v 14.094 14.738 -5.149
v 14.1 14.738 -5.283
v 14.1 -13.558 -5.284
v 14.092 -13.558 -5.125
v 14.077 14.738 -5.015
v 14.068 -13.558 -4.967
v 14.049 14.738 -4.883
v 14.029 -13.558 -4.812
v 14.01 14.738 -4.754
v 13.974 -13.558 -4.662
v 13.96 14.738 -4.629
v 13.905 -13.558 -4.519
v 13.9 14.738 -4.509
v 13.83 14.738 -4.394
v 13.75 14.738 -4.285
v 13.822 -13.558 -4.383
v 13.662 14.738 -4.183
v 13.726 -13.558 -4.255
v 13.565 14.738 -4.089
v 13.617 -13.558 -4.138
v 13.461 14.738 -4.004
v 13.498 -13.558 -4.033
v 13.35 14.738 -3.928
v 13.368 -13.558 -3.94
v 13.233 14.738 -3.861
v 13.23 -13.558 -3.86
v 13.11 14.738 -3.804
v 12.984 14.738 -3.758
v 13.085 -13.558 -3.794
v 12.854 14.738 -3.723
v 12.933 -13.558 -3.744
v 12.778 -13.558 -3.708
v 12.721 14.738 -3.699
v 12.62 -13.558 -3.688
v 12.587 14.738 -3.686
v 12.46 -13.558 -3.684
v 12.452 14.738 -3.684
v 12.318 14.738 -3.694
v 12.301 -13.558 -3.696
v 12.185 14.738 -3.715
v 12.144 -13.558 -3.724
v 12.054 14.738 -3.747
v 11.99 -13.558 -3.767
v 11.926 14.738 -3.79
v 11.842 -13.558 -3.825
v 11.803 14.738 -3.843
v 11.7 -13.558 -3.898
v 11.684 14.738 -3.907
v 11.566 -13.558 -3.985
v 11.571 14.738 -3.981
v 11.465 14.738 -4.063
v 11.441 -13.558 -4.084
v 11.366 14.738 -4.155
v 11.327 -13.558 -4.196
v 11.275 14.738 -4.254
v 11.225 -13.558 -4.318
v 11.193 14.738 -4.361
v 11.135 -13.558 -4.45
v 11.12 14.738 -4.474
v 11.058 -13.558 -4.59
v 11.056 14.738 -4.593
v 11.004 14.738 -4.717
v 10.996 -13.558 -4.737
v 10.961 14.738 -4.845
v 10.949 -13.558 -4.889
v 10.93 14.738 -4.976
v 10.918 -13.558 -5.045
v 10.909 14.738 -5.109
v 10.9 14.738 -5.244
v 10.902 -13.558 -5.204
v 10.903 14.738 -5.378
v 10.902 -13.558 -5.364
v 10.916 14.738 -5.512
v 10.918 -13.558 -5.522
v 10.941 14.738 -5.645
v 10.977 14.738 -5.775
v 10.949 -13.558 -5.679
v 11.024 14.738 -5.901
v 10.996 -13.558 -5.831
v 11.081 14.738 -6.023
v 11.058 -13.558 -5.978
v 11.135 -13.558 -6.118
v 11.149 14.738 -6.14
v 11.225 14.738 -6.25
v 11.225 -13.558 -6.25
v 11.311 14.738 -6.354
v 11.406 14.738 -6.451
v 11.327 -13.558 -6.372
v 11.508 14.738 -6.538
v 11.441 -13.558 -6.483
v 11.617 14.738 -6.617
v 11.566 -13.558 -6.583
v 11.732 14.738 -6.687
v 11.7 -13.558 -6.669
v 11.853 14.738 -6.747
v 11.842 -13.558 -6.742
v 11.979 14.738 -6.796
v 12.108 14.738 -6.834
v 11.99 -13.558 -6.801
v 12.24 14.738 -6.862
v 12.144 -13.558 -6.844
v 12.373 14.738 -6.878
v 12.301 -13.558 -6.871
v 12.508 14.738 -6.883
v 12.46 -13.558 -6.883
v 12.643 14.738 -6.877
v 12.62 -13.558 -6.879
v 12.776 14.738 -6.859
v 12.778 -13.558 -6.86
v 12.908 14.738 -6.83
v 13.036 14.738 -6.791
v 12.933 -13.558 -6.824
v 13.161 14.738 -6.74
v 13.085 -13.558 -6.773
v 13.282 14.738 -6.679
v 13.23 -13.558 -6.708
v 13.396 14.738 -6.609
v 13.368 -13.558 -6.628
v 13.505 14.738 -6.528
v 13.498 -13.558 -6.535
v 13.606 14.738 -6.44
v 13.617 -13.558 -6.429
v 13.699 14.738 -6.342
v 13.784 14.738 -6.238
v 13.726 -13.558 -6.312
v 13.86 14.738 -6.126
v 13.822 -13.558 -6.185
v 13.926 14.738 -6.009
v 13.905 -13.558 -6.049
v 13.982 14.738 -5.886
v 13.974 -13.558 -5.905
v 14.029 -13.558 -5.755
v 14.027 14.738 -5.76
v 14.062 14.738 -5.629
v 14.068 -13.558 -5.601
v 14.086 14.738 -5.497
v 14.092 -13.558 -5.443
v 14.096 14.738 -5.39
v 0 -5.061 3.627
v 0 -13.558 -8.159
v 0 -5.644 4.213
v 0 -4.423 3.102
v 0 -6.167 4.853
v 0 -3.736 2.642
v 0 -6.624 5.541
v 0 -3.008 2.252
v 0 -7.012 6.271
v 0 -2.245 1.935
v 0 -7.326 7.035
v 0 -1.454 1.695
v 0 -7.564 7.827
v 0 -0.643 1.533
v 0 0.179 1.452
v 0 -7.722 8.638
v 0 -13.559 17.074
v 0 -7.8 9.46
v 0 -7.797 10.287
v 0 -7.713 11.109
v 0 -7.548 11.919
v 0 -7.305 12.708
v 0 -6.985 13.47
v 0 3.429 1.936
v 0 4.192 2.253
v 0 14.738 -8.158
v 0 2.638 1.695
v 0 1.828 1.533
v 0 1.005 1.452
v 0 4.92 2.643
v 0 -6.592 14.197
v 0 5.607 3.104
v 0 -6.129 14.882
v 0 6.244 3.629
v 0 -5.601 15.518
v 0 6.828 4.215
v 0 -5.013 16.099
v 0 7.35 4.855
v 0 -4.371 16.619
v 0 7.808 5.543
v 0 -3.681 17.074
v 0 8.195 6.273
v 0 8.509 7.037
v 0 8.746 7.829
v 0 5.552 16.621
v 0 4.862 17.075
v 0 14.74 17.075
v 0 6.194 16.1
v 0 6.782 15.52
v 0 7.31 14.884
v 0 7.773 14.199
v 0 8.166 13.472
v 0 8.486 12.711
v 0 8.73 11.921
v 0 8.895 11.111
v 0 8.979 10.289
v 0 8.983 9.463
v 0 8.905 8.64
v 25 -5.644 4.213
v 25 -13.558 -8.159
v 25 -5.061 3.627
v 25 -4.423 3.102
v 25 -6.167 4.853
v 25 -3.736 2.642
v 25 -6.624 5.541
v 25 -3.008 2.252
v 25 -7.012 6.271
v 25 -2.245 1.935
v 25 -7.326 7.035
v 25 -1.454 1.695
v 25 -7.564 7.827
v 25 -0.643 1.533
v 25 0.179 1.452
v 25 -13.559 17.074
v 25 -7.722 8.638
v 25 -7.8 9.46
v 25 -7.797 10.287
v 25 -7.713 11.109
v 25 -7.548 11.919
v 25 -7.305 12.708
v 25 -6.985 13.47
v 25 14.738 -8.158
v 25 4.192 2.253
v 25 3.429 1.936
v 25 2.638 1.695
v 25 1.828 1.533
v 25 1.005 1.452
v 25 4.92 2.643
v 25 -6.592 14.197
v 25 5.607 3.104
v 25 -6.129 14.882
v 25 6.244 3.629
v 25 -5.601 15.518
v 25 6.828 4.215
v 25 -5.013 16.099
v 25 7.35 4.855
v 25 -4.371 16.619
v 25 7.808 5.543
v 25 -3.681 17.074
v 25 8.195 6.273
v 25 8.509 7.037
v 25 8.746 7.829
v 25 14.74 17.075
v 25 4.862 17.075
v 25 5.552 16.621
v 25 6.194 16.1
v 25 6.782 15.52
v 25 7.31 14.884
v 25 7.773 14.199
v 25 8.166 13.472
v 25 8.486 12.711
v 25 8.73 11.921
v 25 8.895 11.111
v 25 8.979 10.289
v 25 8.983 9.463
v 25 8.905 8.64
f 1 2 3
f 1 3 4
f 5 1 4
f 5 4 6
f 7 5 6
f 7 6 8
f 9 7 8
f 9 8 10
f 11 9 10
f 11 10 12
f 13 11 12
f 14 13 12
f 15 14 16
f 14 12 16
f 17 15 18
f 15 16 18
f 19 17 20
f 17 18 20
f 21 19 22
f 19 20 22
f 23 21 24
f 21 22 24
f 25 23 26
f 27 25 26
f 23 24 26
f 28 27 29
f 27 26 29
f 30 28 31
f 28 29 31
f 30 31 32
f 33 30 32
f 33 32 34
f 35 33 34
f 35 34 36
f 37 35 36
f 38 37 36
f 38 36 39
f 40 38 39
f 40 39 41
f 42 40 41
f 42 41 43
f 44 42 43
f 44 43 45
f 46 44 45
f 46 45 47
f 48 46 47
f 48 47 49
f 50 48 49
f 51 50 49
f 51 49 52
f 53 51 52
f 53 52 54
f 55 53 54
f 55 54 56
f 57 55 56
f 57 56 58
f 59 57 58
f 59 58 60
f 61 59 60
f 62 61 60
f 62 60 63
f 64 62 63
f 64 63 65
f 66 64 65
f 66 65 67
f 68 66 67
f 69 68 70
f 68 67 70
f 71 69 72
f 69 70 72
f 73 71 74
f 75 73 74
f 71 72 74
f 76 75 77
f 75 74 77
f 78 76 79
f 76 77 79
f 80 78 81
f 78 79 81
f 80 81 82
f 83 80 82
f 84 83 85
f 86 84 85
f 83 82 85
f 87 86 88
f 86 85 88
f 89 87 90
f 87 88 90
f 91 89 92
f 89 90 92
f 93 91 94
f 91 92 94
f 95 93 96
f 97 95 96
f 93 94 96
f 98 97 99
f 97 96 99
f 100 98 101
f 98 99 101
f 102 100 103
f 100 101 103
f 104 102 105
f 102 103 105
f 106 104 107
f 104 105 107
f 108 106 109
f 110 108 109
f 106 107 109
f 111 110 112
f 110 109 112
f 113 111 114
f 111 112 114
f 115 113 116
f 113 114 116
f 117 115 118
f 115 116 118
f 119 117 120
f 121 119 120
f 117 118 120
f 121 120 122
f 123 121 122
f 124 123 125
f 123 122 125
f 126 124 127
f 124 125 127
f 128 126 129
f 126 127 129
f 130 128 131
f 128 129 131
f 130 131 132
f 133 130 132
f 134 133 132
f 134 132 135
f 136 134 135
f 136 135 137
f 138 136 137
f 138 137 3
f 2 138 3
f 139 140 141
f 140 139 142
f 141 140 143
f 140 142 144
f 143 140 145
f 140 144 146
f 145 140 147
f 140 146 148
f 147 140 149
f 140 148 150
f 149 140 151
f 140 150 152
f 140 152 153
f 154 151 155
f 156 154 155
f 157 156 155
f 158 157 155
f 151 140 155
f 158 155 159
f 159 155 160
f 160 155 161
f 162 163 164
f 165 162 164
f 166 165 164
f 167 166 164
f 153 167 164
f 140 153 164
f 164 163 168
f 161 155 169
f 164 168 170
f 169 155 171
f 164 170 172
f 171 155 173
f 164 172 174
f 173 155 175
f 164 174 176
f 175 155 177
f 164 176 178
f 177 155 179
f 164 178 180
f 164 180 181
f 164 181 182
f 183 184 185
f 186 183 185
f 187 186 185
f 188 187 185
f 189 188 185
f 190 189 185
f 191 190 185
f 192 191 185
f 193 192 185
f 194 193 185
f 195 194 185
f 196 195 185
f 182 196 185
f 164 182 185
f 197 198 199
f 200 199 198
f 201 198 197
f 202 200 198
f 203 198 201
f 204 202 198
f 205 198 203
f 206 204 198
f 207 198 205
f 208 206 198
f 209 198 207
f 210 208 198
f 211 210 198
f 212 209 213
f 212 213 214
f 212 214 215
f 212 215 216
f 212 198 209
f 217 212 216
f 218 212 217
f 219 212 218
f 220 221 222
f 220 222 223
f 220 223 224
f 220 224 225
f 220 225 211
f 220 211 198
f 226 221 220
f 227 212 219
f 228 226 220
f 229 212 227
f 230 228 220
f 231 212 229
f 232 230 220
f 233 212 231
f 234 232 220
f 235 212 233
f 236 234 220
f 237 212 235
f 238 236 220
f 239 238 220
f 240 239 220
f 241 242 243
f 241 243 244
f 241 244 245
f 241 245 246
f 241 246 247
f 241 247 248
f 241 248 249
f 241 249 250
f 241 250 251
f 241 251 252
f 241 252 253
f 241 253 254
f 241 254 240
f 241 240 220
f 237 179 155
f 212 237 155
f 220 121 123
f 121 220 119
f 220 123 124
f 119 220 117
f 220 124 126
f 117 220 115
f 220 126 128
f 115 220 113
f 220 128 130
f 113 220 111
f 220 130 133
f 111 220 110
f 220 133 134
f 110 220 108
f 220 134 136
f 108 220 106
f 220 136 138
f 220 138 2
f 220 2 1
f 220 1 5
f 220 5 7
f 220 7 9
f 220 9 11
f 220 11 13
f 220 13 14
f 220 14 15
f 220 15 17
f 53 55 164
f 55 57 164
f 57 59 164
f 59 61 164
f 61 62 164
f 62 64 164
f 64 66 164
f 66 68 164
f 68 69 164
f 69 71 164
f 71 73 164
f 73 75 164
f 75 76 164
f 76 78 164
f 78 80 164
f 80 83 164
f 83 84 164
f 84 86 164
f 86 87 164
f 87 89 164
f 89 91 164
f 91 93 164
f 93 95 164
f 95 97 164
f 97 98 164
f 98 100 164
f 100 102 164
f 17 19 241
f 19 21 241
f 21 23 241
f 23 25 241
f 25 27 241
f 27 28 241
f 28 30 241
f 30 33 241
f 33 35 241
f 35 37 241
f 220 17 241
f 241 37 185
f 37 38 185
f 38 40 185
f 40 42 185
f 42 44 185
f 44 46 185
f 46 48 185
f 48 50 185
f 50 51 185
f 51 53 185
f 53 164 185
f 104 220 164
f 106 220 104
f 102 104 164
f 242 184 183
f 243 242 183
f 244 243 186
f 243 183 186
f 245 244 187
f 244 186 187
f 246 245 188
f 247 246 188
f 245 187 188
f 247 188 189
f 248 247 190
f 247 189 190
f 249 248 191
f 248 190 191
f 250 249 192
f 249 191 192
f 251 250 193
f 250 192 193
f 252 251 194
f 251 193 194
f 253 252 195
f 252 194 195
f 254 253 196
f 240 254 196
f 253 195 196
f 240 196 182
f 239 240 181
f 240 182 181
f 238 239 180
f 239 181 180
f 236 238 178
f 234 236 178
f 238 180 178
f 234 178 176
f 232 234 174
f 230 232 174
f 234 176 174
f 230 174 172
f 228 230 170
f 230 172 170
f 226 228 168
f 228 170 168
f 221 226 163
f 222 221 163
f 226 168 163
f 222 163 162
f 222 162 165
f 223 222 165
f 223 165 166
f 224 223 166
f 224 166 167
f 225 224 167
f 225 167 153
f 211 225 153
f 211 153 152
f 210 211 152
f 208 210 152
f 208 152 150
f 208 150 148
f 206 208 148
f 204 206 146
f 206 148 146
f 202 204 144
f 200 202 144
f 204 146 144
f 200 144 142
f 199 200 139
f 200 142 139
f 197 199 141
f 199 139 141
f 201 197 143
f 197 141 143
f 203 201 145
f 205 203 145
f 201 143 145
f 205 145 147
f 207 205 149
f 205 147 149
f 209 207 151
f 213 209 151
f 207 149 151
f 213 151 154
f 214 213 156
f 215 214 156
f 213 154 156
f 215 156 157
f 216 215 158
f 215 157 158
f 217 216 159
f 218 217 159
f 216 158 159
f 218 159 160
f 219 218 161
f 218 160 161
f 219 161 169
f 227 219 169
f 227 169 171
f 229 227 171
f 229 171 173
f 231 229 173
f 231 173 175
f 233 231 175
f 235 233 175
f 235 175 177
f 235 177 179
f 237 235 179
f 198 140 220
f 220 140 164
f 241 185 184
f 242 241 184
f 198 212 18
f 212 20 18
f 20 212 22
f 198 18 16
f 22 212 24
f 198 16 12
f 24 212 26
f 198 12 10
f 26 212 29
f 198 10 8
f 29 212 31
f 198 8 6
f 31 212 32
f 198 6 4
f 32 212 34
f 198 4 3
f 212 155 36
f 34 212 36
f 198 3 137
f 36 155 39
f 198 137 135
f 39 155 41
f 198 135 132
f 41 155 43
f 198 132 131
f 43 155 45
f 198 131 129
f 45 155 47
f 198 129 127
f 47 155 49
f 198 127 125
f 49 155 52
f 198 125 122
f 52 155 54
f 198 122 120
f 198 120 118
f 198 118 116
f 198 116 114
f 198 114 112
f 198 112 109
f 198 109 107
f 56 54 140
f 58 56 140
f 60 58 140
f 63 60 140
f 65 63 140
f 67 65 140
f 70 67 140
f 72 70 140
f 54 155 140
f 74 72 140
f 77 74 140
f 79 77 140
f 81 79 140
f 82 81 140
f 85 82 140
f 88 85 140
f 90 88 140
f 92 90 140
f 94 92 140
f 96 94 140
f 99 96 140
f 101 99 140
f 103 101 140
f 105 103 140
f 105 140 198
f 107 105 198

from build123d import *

# Parameters (mm, degrees)
F1_DEPTH = 25
F2_R     = 1.6
F3_DEPTH = 32


with BuildPart() as f1:
    # F0 (on Right) → F1 (new body)
    with BuildSketch(Plane.YZ):
        with BuildLine():
            ThreePointArc((4.861622, 17.075245), (0.592168, 1.441825), (-3.681383, 17.074125))
            Line((-3.681383, 17.074125), (-13.558886, 17.074125))
            Line((-13.558886, 17.074125), (-13.558383, -8.158872))
            Line((-13.558383, -8.158872), (14.738216, -8.158172))
            Line((14.738216, -8.158172), (14.739622, 17.075245))
            Line((14.739622, 17.075245), (4.861622, 17.075245))
        make_face()
    extrude(amount=F1_DEPTH)

    # F2 (on face) → F3 (cut)
    with BuildSketch(Plane(origin=(0, -13.558546, -0.00027), x_dir=(1, 0, 0), z_dir=(0, -1, -2e-05))):
        with Locations((12.5, -5.28356)):
            Circle(F2_R)
    extrude(amount=-F3_DEPTH, mode=Mode.SUBTRACT)


solid = f1.part
